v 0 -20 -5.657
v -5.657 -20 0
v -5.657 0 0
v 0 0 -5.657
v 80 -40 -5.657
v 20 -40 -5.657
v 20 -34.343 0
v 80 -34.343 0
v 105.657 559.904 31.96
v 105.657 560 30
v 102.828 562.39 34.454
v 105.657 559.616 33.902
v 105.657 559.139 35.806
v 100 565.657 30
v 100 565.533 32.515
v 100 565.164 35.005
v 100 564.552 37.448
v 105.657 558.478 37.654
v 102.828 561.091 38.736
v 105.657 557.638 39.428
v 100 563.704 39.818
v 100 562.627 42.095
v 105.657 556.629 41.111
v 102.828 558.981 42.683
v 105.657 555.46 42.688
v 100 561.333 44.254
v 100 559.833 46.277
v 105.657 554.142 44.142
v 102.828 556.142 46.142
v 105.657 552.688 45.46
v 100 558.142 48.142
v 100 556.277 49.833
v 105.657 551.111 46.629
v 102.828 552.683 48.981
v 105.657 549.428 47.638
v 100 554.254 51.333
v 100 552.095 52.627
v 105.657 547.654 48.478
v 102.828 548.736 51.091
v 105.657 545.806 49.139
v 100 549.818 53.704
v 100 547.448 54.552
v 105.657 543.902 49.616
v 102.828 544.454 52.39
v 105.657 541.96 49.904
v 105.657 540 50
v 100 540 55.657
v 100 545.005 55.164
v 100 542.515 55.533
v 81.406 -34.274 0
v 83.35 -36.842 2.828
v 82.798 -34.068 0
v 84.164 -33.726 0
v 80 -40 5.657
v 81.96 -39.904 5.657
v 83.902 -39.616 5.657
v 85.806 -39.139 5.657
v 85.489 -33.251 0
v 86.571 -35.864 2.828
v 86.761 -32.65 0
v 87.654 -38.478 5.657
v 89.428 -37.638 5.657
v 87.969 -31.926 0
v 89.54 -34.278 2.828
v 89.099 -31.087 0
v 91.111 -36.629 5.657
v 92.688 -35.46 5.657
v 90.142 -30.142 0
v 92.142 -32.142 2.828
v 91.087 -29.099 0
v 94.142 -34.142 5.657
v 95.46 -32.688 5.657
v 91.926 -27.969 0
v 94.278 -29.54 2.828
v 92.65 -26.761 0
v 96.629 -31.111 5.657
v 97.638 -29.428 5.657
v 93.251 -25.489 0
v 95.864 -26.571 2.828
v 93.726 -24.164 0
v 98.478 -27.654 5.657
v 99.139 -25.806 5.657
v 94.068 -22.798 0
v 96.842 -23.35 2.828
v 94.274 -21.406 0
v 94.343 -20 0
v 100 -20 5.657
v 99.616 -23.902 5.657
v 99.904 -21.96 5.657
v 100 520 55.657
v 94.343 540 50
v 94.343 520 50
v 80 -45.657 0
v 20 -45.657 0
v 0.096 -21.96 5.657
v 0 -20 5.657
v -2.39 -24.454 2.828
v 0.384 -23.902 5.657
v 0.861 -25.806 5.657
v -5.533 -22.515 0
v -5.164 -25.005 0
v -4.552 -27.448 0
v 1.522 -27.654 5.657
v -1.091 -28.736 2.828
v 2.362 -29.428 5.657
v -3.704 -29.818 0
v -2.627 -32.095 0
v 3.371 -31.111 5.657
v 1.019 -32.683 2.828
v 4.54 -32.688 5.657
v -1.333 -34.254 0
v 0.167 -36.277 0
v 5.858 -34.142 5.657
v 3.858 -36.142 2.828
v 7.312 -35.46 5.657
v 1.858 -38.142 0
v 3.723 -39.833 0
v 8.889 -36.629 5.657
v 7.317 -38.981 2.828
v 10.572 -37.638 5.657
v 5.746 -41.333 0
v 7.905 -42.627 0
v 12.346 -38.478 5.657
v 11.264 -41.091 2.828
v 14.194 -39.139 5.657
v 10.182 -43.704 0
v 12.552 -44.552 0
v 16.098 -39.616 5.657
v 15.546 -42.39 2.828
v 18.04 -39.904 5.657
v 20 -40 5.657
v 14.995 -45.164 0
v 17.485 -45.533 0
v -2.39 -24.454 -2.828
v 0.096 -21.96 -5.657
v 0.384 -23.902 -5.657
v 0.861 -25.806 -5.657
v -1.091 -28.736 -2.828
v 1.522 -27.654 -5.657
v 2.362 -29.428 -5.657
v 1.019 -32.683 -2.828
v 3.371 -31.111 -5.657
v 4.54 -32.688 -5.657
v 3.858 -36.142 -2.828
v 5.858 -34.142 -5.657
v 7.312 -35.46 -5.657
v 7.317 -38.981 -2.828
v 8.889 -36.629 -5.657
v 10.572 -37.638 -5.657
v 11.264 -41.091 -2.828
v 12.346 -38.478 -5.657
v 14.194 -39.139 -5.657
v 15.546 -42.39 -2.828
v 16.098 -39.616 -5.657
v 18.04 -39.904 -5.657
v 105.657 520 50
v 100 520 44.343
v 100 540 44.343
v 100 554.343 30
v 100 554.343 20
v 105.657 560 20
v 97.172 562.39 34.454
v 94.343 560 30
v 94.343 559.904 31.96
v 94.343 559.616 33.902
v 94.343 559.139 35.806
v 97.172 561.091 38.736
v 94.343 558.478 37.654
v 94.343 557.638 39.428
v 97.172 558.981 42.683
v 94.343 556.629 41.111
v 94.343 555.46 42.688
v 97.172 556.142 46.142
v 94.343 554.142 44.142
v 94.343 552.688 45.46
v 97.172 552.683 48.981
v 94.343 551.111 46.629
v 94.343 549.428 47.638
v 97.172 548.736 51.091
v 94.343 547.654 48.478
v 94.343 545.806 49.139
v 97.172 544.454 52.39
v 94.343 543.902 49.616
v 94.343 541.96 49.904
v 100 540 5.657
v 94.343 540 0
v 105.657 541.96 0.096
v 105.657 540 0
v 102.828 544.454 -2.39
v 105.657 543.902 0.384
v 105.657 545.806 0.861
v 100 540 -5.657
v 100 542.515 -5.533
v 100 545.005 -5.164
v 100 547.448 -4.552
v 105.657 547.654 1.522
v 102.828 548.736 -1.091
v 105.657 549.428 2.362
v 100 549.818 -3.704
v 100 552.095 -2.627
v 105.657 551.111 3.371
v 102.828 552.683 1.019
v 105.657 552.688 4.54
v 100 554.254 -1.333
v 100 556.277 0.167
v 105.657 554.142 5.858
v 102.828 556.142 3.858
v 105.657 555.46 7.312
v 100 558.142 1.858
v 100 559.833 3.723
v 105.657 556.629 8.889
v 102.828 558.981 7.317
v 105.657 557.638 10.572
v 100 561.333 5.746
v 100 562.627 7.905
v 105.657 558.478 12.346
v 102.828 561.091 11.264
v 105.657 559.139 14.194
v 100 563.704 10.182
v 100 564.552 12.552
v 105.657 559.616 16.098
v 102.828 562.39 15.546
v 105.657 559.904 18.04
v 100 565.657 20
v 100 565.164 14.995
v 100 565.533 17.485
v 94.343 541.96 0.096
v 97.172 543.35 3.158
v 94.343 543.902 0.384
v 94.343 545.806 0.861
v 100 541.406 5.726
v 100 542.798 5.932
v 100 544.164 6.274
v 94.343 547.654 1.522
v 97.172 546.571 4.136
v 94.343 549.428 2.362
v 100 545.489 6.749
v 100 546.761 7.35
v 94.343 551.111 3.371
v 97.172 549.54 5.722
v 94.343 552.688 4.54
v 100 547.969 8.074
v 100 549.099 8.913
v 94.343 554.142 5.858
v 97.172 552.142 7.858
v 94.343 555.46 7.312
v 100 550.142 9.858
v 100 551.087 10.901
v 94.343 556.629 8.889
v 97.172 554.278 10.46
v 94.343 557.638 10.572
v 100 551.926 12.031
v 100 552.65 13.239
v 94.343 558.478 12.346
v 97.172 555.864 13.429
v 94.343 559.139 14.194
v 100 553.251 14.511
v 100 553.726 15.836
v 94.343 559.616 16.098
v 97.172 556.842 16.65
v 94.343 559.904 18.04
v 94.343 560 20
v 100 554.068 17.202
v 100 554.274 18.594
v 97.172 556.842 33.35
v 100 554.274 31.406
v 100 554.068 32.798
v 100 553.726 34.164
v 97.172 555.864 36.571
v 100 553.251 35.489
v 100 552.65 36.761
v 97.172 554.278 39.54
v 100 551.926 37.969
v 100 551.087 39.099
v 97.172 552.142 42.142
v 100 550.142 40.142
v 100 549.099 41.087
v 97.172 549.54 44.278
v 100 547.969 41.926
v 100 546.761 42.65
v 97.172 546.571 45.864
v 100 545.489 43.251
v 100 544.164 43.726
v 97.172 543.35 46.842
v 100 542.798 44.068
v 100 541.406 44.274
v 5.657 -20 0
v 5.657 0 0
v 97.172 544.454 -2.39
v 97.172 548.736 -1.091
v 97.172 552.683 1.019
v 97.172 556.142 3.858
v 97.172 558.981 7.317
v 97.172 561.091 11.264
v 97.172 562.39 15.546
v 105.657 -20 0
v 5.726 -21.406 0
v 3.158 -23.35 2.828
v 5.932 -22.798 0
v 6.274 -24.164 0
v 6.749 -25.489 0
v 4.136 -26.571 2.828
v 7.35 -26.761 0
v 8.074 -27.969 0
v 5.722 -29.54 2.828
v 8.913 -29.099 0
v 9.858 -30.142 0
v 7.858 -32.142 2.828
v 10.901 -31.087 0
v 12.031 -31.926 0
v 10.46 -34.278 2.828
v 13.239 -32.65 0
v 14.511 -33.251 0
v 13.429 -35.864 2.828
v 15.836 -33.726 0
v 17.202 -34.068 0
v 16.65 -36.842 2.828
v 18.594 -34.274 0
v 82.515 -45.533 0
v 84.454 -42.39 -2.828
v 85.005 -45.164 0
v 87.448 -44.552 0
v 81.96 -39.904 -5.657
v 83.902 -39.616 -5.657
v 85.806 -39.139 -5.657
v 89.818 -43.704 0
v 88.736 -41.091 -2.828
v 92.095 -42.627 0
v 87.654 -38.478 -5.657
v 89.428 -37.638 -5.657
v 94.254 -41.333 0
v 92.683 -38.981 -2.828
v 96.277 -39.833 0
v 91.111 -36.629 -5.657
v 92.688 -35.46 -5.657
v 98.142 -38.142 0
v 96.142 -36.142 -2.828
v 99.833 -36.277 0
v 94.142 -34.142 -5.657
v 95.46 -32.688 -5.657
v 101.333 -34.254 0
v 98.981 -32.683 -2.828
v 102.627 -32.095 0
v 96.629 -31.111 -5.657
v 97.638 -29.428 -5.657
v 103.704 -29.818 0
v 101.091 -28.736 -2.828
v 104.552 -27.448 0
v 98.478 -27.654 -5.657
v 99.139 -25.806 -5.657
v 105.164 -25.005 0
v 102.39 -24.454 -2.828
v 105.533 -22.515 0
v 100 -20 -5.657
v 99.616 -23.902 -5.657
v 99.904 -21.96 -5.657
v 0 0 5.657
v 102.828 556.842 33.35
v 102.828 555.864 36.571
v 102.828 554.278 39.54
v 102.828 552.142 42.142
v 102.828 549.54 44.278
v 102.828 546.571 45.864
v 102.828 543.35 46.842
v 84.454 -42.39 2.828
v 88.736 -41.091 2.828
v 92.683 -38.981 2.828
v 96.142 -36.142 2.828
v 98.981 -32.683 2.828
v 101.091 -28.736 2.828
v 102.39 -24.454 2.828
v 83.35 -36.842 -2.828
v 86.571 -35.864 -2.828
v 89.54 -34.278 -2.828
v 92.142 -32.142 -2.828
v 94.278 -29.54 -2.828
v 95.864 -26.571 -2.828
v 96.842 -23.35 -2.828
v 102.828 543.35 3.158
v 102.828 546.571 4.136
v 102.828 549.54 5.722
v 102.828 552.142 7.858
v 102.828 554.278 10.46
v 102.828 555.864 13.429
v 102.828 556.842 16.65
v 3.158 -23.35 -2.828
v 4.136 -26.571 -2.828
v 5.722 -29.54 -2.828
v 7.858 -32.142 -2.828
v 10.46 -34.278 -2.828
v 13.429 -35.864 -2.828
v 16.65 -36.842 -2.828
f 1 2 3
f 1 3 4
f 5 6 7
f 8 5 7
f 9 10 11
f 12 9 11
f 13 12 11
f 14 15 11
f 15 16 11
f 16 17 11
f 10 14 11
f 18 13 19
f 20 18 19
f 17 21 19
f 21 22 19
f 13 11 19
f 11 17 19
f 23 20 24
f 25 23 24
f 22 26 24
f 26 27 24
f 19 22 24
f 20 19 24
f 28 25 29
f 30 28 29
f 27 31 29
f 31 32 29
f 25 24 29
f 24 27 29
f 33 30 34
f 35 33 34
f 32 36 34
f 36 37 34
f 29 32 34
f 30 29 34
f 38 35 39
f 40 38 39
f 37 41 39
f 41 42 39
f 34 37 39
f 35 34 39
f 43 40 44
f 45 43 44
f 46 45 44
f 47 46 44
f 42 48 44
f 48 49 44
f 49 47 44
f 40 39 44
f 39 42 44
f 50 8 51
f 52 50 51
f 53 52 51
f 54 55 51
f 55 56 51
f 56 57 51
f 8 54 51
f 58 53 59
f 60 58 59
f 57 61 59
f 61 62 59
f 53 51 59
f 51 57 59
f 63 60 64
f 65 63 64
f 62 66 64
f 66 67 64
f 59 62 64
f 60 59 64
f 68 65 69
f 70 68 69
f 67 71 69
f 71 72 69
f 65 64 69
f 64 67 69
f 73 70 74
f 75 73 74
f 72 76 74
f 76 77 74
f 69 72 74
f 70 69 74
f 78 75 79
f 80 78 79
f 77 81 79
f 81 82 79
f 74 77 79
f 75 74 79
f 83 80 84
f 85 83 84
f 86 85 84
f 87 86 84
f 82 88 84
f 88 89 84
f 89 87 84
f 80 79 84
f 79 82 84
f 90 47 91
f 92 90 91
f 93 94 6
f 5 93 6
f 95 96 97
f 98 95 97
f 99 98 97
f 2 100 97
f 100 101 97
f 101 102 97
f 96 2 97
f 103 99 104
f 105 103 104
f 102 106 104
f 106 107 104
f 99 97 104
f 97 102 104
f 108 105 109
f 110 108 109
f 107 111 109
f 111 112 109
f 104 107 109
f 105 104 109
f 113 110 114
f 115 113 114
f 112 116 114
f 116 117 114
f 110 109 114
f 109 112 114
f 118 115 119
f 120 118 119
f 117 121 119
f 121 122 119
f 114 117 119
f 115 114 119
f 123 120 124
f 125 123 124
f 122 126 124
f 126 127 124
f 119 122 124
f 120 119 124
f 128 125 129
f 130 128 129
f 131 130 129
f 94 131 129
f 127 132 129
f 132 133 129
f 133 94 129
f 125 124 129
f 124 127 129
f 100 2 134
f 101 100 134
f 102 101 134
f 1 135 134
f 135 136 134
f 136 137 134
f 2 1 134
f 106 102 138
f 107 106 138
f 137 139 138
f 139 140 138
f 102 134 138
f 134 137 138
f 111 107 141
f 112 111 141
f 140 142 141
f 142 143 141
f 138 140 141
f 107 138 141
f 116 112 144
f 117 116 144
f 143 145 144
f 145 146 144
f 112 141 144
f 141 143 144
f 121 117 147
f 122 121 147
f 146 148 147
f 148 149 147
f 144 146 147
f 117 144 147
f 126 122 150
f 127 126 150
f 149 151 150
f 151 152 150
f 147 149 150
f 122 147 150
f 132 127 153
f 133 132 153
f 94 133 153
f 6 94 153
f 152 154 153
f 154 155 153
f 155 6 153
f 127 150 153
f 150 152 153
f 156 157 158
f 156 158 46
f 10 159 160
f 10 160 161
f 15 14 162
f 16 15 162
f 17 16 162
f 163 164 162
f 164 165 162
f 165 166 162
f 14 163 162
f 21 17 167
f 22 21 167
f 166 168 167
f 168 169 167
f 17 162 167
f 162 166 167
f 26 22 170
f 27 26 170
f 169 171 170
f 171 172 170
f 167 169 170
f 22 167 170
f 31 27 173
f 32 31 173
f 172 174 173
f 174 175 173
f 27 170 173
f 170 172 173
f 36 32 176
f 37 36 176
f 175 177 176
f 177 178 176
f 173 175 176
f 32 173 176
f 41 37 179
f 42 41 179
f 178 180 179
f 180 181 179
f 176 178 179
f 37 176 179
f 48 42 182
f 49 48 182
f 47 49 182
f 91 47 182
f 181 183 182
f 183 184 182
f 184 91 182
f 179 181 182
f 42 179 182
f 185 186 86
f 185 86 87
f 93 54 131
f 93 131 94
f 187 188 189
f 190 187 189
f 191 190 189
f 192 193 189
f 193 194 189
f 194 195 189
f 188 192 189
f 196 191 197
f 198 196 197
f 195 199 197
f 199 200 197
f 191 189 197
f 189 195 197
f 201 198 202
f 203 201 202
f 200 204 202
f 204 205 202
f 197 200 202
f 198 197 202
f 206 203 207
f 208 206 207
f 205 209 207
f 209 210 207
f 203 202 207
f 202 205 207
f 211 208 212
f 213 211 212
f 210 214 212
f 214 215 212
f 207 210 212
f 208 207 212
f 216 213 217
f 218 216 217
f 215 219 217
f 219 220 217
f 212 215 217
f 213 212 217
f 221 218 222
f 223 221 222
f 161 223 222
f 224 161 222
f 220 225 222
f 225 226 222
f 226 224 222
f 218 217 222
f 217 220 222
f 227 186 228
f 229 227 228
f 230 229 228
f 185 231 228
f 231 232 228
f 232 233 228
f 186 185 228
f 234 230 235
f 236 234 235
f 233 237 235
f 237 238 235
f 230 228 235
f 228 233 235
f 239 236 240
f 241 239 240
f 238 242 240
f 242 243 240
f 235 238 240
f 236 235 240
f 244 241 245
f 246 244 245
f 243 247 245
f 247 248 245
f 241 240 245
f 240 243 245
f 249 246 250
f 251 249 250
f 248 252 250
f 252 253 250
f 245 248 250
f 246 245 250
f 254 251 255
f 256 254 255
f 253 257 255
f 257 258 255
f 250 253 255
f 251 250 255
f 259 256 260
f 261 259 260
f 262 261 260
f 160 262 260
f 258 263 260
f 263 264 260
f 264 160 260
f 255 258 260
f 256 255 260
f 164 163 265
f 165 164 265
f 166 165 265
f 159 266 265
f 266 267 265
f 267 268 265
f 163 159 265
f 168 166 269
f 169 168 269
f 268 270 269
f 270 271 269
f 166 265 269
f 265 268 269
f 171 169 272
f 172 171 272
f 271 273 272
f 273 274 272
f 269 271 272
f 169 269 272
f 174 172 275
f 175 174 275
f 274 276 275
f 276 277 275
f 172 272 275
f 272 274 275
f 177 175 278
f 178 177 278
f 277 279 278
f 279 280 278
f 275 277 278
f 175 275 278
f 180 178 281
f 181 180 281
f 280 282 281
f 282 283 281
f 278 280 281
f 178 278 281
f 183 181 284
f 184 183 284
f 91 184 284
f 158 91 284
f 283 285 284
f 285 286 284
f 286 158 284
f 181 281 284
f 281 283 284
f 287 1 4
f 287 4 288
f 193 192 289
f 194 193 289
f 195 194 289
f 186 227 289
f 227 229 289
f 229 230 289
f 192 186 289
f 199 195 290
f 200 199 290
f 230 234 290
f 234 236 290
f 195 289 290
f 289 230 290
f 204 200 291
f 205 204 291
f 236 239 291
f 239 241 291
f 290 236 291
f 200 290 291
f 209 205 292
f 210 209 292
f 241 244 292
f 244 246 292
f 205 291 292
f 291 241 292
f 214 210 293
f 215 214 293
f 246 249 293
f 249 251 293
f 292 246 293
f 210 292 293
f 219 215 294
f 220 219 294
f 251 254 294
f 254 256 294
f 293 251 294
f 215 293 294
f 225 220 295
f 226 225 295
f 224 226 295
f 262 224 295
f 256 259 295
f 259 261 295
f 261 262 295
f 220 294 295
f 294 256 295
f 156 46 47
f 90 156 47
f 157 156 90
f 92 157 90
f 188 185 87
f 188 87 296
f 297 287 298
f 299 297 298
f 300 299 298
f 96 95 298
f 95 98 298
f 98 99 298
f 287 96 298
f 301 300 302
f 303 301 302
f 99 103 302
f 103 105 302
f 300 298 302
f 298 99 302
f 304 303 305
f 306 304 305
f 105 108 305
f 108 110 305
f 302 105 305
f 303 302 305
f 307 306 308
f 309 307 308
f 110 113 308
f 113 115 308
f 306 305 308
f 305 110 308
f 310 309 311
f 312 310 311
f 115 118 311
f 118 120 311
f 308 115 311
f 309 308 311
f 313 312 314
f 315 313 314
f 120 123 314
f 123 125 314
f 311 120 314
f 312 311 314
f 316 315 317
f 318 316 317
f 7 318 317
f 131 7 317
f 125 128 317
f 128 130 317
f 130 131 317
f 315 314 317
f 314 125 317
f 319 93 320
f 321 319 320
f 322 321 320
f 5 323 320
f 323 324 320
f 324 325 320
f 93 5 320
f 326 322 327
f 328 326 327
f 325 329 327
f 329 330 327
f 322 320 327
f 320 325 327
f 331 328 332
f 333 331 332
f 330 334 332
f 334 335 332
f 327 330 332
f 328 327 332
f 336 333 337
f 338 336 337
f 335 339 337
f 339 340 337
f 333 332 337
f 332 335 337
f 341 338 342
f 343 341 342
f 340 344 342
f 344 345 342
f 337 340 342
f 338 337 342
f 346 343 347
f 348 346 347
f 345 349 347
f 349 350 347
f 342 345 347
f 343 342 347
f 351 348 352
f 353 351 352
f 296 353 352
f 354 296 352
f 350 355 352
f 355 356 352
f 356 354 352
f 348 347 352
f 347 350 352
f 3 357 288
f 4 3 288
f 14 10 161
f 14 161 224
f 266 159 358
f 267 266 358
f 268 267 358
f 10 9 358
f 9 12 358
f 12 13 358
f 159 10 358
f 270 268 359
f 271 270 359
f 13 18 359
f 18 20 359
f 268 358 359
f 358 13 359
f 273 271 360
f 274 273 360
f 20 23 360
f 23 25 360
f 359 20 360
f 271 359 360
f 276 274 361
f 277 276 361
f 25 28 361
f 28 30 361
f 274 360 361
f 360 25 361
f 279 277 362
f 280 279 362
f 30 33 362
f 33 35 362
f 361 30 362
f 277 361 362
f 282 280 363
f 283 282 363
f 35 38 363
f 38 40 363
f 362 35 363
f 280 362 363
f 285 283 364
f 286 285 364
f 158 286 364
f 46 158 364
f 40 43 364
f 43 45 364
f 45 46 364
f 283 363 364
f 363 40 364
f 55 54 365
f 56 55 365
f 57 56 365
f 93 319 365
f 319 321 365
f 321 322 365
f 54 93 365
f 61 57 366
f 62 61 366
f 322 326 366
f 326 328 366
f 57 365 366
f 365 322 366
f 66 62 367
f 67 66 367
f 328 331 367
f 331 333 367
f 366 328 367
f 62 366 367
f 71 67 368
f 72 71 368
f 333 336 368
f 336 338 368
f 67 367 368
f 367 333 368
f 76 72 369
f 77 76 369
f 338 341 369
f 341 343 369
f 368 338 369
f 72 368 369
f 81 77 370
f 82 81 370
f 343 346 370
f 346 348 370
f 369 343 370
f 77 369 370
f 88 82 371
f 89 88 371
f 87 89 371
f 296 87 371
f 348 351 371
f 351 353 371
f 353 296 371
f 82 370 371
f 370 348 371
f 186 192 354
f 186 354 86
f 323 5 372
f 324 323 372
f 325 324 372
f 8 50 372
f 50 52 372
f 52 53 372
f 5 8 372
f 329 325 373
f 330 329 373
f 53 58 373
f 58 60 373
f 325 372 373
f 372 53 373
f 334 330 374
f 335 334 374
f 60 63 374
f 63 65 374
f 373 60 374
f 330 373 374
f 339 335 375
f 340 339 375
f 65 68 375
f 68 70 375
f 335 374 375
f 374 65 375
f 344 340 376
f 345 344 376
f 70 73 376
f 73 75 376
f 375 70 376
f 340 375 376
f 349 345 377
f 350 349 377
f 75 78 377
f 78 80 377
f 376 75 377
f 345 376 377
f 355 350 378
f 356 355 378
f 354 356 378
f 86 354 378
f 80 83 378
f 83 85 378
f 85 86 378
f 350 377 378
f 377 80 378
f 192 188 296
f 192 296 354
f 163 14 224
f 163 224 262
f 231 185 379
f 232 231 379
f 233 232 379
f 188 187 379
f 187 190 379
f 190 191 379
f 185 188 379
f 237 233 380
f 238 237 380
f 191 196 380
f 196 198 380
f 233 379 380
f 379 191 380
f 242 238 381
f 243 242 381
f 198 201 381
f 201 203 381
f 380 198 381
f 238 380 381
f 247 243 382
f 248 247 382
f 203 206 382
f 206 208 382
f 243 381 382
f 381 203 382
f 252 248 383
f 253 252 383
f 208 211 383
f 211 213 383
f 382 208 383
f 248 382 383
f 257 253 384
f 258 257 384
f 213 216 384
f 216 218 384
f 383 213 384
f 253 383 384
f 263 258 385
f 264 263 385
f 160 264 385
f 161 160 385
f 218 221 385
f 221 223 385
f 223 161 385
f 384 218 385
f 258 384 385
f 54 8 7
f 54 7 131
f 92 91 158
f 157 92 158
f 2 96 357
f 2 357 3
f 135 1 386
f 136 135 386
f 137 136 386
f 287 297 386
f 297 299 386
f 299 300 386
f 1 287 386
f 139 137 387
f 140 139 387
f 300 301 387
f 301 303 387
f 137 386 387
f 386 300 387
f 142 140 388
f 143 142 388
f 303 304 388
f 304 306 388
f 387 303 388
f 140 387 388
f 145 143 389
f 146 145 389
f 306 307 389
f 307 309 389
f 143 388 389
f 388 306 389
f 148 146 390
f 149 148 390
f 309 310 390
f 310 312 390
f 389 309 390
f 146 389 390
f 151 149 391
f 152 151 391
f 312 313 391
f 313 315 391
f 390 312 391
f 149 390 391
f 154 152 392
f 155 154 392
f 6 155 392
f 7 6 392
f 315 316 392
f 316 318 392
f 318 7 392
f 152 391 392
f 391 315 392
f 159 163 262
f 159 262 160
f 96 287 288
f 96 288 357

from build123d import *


with BuildPart() as f4:
    # F4: sweep along a path in F0, F2
    with BuildLine(Plane.XY) as f4_path:
        Line((0, 0), (0, -20))
        ThreePointArc((0, -20), (5.8578643763, -34.1421356237), (20, -40))
        Line((20, -40), (80, -40))
        ThreePointArc((80, -40), (94.1421356237, -34.1421356237), (100, -20))
        Line((100, -20), (100, 540))
    with BuildLine(Plane.YZ.offset(100)) as f4_path_2:
        ThreePointArc((540, 0), (554.1421356237, 5.8578643763), (560, 20))
        Line((560, 20), (560, 30))
        ThreePointArc((560, 30), (554.1421356237, 44.1421356237), (540, 50))
        Line((540, 50), (520, 50))
    # F3 (on Front) → F4 (sweep)
    with BuildSketch(Plane.XZ):
        Polygon((0, -5.6568542495), (5.6568542495, 0), (0, 5.6568542495), (-5.6568542495, 0), align=None)
    sweep(path=f4_path.line + f4_path_2.line)


solid = f4.part
